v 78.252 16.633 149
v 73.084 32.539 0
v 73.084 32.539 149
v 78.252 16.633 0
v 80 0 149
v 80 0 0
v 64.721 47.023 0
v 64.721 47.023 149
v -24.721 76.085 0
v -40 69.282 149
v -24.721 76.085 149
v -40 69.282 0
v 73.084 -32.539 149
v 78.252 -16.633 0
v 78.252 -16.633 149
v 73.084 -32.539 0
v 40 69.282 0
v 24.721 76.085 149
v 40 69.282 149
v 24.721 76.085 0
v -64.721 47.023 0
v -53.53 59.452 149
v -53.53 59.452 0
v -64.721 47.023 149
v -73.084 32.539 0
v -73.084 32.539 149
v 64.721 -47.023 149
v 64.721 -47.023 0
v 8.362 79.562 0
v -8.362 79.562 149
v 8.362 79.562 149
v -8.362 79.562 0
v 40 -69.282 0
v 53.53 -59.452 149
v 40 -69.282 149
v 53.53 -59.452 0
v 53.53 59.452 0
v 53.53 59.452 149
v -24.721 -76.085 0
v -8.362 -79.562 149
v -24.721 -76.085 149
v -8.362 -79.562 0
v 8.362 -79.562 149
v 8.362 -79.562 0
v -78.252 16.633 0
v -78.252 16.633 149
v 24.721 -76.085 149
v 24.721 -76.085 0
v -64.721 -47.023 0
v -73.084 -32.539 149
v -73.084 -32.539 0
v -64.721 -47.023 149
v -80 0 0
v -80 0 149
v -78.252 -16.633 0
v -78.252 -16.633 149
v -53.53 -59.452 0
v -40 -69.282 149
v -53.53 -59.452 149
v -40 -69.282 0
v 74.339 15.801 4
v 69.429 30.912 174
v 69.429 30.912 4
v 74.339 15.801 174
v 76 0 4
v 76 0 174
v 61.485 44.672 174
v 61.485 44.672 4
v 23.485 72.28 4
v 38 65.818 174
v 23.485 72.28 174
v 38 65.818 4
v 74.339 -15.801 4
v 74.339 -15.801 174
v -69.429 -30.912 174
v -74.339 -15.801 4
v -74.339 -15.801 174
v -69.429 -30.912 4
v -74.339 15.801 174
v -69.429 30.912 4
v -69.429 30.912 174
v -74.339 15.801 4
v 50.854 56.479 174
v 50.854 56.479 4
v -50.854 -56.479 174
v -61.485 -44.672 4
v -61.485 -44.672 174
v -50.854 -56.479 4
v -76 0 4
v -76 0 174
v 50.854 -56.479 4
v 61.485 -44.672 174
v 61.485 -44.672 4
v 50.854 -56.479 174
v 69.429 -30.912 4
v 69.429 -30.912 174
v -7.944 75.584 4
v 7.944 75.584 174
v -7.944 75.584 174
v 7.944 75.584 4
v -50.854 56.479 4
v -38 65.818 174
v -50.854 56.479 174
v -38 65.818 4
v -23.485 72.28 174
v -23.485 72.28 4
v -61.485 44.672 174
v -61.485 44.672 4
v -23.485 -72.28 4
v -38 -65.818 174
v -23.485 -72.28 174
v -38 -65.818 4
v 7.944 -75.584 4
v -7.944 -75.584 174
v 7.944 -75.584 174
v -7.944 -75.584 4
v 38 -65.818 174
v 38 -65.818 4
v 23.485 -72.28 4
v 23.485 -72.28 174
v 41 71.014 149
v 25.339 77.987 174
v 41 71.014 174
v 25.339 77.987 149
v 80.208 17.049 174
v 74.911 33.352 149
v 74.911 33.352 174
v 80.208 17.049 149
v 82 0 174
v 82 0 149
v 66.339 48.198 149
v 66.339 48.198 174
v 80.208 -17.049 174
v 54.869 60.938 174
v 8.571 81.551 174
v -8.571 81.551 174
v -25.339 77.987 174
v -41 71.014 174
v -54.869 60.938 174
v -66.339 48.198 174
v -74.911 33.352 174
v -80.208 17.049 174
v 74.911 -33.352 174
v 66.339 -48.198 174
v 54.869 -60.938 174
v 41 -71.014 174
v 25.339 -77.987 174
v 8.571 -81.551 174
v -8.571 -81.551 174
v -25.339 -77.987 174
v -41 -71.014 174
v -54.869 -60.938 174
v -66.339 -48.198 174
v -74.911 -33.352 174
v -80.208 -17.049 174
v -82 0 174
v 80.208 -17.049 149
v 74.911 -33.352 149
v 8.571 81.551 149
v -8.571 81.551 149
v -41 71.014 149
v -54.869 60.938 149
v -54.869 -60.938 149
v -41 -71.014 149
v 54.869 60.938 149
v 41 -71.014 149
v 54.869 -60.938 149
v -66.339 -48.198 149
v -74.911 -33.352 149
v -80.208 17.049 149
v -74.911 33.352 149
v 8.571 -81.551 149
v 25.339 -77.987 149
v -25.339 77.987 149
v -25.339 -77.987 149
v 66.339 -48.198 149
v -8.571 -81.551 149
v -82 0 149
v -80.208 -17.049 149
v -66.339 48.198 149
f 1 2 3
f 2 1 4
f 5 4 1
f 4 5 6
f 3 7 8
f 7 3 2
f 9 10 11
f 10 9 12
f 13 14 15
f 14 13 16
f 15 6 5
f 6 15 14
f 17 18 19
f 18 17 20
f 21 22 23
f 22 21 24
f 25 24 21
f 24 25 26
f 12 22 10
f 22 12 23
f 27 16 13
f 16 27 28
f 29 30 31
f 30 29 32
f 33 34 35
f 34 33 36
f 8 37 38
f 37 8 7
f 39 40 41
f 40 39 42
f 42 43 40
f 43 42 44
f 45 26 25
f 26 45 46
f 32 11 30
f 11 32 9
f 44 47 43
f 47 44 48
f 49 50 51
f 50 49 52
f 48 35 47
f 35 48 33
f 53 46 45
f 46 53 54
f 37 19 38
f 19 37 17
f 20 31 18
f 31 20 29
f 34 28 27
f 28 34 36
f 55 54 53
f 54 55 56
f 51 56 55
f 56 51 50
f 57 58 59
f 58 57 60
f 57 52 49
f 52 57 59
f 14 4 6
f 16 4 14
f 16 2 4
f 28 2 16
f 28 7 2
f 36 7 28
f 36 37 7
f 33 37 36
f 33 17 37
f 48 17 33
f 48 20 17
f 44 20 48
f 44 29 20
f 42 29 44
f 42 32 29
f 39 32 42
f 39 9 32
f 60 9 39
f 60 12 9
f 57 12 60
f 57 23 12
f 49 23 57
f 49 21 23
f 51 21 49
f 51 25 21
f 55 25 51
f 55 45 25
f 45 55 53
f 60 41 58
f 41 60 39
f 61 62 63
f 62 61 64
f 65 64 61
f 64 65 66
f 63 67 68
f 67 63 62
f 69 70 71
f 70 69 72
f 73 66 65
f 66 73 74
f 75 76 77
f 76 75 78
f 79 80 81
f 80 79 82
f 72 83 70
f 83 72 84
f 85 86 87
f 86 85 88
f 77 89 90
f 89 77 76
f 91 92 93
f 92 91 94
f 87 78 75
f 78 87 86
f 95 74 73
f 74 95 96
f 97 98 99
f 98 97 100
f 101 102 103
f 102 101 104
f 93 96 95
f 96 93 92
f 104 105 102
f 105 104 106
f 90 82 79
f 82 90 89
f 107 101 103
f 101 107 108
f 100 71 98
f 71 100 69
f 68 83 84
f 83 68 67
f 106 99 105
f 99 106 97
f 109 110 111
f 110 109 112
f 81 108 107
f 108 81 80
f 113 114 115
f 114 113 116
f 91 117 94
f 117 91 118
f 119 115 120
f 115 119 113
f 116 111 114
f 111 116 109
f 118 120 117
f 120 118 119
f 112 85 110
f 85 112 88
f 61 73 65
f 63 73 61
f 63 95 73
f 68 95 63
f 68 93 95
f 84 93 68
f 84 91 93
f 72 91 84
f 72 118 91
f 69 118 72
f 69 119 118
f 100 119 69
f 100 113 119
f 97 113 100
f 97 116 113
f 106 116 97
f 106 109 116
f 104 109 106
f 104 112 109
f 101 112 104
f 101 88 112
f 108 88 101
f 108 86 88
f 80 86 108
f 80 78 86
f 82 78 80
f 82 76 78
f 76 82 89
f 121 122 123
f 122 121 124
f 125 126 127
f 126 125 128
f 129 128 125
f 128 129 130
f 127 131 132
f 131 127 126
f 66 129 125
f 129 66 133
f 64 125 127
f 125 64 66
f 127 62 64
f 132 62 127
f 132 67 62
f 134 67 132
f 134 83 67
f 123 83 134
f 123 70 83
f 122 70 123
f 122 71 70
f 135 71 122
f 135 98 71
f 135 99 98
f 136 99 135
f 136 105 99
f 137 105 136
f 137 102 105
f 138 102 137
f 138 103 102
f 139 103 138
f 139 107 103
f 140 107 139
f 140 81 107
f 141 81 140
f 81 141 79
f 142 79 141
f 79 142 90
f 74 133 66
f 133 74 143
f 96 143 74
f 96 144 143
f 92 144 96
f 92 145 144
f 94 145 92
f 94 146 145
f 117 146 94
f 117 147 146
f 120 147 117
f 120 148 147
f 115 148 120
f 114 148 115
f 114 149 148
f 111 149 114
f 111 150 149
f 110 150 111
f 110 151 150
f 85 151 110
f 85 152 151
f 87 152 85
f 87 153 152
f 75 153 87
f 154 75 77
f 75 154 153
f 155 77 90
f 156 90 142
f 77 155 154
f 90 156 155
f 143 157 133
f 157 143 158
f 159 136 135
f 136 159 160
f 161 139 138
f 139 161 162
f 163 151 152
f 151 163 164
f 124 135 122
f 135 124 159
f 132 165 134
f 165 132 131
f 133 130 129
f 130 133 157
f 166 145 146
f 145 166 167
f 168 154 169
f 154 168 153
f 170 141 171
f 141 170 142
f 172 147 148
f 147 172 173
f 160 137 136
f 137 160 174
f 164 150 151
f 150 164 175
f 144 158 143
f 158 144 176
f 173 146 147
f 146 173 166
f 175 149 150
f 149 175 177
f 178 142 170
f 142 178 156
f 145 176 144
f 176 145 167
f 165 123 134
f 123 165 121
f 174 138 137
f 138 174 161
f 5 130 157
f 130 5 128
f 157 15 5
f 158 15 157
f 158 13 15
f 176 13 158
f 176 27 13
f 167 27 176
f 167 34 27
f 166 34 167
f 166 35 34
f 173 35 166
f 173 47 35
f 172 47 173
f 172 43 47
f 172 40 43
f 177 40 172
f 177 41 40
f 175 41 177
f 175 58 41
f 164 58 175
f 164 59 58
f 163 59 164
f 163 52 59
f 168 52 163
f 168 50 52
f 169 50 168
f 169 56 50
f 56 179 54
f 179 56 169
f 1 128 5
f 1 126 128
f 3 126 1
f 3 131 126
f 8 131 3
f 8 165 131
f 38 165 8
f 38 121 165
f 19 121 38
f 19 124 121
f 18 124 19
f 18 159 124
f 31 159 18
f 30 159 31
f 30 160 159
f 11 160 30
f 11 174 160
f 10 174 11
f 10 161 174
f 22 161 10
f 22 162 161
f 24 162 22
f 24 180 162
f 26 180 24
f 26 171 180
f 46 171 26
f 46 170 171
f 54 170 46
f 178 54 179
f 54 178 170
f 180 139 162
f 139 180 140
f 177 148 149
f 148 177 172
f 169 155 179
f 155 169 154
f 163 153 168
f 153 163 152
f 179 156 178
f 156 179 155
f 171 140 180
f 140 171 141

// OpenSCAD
// Parameters
pipe_standard = 1; //[1:1:1]
nominal_size = 160; //[80:320:1]
length_mm = 150; //[75:300:1]
od_mm = 160; //[80:320:1]
wall_mm = 4; //[2:8:0.5]
socket_length_mm = 25; //[12:50:1]
socket_wall_extra_mm = 2; //[1:6:0.5]
overlap_mm = 1; //[0.5:2:0.1]

// Module for HT Pipe
module ht_pipe() {
  color([0.85, 0.85, 0.8]) { // PVC color
    union() {
      // Pipe body
      difference() {
        cylinder(h=length_mm, r=od_mm/2, center=false);
        translate([0, 0, wall_mm])
          cylinder(h=length_mm - wall_mm, r=od_mm/2 - wall_mm, center=false);
      }
      // End fitting
      difference() {
        translate([0, 0, length_mm - overlap_mm])
          cylinder(h=socket_length_mm, r=od_mm/2 + socket_wall_extra_mm, center=false);
        translate([0, 0, length_mm - overlap_mm])
          cylinder(h=socket_length_mm, r=od_mm/2 - wall_mm, center=false);
      }
    }
  }
}

// Assembly
module assembly() {
  ht_pipe();
}

assembly();
